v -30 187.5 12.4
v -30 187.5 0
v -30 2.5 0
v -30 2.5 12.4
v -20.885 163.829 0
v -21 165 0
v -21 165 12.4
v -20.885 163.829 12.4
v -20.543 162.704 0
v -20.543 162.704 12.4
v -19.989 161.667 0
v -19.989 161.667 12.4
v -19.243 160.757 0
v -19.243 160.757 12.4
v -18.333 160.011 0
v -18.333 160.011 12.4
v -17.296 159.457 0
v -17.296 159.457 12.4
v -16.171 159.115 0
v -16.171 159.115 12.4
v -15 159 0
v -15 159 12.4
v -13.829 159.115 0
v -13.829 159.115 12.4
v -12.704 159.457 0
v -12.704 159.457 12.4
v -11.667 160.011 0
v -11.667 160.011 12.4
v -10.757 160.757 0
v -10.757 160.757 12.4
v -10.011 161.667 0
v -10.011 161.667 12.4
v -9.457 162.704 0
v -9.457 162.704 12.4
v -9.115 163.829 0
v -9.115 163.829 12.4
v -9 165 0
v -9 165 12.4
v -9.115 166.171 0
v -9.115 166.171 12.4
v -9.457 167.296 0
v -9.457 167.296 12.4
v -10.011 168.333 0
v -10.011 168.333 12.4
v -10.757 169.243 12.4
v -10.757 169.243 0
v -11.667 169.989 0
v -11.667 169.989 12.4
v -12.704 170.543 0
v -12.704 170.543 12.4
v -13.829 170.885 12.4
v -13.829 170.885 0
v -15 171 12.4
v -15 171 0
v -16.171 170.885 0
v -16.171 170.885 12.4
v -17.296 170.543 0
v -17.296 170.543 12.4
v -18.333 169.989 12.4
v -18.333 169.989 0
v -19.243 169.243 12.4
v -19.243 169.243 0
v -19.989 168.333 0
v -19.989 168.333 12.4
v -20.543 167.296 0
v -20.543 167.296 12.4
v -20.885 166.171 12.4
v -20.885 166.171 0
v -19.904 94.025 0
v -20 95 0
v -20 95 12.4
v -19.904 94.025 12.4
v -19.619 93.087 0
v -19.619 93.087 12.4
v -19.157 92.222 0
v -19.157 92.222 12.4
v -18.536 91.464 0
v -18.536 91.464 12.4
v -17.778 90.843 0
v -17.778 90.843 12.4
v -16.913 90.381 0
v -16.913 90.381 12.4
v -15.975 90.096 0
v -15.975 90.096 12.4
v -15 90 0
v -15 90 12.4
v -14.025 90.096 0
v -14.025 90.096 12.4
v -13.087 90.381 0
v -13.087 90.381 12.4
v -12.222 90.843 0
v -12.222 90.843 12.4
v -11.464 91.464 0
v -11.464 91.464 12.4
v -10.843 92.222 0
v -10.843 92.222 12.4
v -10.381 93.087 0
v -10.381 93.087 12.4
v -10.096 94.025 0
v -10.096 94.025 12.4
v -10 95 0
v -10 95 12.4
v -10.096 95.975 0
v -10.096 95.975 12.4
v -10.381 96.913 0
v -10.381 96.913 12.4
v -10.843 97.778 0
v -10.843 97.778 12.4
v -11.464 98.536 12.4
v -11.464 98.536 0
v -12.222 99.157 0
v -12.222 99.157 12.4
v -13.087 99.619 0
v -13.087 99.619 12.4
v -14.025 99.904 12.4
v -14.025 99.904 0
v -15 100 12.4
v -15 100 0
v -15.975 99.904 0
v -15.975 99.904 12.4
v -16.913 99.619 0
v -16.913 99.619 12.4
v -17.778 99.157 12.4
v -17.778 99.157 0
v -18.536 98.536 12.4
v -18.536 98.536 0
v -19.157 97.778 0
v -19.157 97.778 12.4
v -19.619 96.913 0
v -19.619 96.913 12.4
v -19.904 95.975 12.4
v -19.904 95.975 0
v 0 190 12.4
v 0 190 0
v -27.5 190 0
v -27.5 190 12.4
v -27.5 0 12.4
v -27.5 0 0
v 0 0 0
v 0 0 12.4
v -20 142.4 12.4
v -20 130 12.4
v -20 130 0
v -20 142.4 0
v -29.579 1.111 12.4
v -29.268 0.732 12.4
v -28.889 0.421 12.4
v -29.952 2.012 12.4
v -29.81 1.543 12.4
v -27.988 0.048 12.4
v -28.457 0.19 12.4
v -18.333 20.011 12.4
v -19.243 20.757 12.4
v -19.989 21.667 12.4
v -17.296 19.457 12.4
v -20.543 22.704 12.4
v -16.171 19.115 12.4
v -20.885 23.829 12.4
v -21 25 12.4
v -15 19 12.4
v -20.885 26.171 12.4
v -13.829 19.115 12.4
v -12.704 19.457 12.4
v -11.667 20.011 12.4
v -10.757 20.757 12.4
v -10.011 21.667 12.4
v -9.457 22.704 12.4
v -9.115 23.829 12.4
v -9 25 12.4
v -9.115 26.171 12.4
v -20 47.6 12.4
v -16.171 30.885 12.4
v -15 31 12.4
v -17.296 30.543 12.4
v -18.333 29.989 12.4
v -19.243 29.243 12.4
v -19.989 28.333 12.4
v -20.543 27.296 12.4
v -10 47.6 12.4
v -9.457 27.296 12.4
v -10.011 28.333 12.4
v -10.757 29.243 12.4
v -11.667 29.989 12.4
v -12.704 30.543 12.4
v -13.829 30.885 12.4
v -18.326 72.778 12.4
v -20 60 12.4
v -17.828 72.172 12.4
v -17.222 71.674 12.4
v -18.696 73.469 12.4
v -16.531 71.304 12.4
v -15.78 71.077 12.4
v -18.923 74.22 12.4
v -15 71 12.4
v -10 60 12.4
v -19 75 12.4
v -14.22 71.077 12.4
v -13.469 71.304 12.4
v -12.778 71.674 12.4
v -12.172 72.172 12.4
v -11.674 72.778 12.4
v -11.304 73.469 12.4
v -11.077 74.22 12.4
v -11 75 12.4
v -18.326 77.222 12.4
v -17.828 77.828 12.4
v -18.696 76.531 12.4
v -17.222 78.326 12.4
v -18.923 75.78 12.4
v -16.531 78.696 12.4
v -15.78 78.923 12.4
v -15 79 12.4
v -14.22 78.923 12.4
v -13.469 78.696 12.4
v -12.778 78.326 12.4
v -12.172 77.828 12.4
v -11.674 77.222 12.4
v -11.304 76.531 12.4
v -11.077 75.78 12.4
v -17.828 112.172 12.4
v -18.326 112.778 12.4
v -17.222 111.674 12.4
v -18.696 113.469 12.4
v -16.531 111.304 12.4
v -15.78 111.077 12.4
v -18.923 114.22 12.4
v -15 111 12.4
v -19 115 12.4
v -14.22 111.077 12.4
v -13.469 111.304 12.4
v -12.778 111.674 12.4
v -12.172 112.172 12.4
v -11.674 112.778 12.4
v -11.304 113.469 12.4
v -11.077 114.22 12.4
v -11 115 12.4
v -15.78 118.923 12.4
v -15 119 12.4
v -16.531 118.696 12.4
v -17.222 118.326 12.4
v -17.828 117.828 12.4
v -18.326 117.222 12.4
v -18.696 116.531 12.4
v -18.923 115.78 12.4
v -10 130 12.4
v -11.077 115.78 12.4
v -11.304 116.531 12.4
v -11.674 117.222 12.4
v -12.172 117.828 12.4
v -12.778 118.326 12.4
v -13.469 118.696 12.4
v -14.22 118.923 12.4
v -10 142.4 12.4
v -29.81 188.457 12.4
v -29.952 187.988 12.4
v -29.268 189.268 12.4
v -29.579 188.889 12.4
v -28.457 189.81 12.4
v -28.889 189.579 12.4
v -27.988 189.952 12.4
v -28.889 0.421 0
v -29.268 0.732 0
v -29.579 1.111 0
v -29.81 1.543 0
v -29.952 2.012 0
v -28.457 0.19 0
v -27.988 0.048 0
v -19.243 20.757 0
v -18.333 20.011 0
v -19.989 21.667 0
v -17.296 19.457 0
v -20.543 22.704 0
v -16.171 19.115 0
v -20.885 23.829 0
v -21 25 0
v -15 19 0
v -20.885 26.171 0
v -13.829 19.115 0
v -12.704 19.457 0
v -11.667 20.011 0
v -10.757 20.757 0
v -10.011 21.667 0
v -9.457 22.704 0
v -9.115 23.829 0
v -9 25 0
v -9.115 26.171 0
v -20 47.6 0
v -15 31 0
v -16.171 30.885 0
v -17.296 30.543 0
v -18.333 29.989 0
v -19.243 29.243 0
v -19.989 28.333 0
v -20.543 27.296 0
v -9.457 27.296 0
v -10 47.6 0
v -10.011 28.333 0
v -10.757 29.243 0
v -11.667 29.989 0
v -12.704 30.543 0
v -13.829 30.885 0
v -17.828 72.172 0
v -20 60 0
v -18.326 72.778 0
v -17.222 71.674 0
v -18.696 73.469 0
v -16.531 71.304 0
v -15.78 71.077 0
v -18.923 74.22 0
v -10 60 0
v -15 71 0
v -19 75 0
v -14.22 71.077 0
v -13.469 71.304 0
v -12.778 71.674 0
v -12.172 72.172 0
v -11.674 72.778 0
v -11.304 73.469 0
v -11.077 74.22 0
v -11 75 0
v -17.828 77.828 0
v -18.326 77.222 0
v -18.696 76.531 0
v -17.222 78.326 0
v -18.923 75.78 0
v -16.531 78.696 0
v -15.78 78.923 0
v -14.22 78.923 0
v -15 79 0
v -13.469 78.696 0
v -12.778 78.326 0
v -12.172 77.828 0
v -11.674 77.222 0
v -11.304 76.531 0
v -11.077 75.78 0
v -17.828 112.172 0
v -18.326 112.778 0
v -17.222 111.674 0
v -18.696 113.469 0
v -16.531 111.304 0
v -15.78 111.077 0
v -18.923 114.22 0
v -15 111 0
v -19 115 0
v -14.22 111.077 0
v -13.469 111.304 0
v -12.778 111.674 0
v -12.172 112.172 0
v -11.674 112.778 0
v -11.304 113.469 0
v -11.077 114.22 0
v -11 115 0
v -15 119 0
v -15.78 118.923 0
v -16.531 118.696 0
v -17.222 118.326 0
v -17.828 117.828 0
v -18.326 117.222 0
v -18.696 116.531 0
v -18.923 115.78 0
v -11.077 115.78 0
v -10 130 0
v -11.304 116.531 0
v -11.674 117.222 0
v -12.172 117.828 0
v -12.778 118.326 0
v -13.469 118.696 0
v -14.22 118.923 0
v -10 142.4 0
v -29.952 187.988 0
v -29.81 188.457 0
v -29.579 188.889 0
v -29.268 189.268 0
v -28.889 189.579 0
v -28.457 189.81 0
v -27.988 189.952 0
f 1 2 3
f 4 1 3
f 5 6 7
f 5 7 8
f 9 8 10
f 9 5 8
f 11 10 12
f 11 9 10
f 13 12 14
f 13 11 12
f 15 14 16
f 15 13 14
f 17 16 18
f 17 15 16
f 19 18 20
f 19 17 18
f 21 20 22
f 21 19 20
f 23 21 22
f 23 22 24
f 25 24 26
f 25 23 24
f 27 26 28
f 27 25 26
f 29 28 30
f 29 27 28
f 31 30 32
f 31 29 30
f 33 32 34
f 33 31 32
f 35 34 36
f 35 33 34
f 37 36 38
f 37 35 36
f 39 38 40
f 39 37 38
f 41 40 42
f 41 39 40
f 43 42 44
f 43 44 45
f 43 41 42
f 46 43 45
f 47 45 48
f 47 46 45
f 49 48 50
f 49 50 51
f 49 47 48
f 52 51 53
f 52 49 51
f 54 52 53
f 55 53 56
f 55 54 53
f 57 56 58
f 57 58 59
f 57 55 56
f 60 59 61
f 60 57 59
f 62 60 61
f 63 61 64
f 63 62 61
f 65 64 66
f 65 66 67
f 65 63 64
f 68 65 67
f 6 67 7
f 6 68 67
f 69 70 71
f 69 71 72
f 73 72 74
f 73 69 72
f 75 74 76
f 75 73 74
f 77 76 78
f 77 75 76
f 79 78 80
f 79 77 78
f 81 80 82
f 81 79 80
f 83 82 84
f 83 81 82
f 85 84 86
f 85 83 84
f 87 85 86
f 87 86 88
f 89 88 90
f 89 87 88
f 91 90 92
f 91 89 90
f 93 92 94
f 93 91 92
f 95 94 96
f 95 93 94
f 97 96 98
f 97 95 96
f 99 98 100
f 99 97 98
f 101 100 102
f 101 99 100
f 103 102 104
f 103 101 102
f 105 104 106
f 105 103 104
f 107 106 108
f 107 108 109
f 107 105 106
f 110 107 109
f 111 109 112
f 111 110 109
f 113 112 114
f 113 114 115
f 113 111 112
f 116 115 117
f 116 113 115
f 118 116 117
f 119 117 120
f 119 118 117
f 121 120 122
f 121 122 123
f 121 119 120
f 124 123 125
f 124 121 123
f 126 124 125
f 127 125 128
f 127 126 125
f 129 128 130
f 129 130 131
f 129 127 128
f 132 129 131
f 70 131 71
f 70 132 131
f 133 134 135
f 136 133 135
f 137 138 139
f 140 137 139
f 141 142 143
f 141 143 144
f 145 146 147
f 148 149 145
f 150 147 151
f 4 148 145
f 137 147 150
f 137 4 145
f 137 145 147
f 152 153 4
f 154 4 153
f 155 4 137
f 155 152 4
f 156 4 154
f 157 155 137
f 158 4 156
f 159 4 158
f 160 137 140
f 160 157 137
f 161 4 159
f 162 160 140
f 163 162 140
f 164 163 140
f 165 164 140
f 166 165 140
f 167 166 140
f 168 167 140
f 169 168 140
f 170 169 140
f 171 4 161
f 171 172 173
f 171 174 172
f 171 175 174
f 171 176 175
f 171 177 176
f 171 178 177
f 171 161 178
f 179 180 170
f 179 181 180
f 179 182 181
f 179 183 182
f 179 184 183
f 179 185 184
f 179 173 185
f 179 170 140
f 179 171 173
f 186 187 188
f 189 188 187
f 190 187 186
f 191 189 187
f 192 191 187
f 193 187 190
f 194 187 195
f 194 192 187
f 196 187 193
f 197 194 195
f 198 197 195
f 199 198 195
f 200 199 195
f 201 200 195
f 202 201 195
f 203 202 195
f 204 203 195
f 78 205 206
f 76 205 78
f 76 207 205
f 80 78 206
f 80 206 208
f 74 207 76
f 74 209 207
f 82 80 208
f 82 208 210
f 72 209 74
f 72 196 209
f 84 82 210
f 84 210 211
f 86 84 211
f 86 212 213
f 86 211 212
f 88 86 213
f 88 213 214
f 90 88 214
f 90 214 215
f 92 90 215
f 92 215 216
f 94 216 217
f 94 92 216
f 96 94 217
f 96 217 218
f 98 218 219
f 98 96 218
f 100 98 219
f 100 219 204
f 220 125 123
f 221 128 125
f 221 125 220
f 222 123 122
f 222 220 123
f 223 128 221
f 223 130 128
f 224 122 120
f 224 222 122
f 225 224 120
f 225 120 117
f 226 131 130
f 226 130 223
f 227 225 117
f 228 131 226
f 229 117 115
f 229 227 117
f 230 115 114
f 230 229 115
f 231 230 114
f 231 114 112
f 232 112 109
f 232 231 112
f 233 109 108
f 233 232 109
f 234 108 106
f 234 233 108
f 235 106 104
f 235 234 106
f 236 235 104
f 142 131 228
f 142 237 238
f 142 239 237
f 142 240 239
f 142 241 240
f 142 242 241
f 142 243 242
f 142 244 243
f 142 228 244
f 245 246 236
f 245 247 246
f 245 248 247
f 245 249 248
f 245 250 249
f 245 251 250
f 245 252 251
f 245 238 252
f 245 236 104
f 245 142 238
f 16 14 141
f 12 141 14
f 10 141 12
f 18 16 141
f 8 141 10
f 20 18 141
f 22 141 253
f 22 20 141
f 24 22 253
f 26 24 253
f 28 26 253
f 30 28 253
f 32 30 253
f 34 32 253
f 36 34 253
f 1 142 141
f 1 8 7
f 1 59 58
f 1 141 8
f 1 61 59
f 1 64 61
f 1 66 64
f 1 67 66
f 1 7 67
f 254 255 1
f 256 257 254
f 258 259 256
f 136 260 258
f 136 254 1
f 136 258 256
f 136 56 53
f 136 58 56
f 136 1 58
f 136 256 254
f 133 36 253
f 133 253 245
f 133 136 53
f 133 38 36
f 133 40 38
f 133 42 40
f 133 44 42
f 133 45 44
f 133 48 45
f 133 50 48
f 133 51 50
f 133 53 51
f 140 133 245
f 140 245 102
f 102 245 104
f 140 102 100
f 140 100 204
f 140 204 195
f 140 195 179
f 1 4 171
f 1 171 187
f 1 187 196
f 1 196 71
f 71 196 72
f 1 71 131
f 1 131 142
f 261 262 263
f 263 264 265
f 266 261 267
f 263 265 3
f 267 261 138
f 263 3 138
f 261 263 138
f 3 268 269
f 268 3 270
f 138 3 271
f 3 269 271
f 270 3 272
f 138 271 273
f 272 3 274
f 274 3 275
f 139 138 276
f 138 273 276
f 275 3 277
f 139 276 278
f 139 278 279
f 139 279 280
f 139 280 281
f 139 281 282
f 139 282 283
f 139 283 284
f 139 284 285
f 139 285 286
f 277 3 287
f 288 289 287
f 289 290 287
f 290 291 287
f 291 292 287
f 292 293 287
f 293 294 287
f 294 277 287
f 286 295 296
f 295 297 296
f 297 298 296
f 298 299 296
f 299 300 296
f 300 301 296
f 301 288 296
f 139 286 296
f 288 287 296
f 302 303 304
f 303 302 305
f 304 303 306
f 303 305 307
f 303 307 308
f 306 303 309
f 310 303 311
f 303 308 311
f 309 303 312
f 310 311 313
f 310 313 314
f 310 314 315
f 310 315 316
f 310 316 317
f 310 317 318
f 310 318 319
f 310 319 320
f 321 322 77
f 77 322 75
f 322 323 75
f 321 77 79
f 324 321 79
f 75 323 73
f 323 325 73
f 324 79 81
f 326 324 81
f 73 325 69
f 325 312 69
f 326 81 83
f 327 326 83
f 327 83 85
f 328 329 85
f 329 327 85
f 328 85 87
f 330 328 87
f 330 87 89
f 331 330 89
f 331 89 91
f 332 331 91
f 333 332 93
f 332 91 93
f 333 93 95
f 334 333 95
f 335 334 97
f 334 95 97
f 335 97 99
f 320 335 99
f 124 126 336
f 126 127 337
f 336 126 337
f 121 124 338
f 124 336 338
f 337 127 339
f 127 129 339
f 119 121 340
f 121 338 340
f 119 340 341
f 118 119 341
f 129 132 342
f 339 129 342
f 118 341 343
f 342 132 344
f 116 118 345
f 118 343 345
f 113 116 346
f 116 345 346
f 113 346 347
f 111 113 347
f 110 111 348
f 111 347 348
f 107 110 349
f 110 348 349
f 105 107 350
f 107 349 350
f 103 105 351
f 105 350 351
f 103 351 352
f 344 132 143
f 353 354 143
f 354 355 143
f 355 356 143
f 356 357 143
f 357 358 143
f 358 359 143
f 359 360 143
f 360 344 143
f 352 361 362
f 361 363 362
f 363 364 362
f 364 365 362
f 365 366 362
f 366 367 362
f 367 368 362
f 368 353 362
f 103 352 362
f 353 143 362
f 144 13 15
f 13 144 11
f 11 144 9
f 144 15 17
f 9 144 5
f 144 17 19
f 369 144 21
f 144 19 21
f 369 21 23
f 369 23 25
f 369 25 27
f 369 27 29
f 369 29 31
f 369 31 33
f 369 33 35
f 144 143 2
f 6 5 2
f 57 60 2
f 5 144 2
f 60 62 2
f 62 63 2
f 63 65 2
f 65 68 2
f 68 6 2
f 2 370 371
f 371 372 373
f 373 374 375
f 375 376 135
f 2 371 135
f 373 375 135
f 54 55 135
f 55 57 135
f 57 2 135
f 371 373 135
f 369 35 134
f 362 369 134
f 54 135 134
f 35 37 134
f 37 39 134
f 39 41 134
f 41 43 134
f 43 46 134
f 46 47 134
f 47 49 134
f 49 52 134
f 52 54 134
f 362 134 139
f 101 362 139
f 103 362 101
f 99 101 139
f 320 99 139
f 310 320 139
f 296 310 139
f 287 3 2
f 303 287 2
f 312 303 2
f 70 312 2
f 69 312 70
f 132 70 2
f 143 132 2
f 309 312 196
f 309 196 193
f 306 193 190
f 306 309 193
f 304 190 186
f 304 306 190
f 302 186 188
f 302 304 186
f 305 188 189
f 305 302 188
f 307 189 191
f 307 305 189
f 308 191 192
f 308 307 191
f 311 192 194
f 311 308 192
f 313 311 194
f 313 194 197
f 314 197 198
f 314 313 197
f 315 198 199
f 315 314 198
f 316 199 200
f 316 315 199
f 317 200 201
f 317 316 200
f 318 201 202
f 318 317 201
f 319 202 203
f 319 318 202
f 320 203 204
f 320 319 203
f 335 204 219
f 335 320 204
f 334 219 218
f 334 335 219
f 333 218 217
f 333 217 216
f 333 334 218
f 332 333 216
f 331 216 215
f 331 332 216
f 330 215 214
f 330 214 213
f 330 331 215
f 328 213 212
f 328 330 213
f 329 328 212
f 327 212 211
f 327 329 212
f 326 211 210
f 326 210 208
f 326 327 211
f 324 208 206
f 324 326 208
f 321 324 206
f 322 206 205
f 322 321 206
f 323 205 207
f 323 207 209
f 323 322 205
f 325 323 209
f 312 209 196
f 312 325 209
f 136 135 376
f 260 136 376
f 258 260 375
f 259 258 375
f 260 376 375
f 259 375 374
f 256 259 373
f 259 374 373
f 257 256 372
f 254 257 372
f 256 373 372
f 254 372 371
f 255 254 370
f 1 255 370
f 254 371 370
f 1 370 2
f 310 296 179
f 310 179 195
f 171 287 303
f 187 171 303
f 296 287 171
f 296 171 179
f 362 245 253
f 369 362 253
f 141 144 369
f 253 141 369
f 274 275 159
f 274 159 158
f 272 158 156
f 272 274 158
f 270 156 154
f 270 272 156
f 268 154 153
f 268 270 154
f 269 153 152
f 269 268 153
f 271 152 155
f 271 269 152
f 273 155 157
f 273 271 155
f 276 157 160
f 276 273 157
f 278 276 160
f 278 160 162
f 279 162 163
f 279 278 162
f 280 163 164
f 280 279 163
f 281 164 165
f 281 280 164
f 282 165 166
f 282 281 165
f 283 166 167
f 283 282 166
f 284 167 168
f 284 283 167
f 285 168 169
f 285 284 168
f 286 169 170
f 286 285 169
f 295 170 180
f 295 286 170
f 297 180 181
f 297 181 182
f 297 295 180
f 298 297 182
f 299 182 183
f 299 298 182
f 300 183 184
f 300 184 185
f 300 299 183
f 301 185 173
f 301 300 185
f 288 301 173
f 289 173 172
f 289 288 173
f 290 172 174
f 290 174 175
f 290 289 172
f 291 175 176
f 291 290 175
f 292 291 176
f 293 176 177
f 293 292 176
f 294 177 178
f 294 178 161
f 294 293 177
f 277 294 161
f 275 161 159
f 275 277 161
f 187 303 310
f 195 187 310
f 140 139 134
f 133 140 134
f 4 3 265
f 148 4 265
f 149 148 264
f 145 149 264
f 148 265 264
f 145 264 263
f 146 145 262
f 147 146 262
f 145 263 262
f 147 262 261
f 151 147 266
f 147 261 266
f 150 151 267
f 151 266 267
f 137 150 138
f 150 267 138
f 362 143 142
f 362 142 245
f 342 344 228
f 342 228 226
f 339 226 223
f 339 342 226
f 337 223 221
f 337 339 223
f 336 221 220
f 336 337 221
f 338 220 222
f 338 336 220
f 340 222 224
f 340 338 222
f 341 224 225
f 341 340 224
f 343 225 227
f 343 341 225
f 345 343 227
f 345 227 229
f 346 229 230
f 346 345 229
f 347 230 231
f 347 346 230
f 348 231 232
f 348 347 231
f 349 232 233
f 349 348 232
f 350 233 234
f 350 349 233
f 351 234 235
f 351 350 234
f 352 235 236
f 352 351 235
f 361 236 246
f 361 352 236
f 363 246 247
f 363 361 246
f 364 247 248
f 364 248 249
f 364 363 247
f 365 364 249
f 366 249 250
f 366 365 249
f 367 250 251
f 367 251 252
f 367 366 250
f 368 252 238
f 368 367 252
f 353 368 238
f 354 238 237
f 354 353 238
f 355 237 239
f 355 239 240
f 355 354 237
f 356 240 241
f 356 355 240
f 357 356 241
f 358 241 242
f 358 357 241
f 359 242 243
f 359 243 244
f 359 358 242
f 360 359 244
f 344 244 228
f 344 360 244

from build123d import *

# Parameters (mm, degrees)
MODEL_R             = 6
MODEL_R_2           = 5
MODEL_R_3           = 4
MODEL_W             = 10
MODEL_H             = 12.4
BOSS_EXTRUDE1_DEPTH = 12.4


with BuildPart() as part:
    # Model → Boss-Extrude1 (new body)
    with BuildSketch(Plane.XY):
        with BuildLine():
            Line((-27.5, 0), (0, 0))
            Line((0, 0), (0, 190))
            Line((0, 190), (-27.5, 190))
            ThreePointArc((-27.5, 190), (-29.267766953, 189.267766953), (-30, 187.5))
            Line((-30, 187.5), (-30, 2.5))
            ThreePointArc((-30, 2.5), (-29.267766953, 0.732233047), (-27.5, 0))
        make_face()
        with Locations(Location((-15, 165, 0), (0, 0, 180))):
            Circle(MODEL_R, mode=Mode.SUBTRACT)
        with Locations(Location((-15, 95, 0), (0, 0, 180))):
            Circle(MODEL_R_2, mode=Mode.SUBTRACT)
        with Locations(Location((-15, 115, 0), (0, 0, 180))):
            Circle(MODEL_R_3, mode=Mode.SUBTRACT)
        with Locations(Location((-15, 25, 0), (0, 0, 180))):
            Circle(MODEL_R, mode=Mode.SUBTRACT)
        with Locations(Location((-15, 75, 0), (0, 0, 180))):
            Circle(MODEL_R_3, mode=Mode.SUBTRACT)
        with Locations((-15, 136.2)):
            Rectangle(MODEL_W, MODEL_H, mode=Mode.SUBTRACT)
        with Locations((-15, 53.8)):
            Rectangle(MODEL_W, MODEL_H, mode=Mode.SUBTRACT)
    extrude(amount=BOSS_EXTRUDE1_DEPTH)


solid = part.part
